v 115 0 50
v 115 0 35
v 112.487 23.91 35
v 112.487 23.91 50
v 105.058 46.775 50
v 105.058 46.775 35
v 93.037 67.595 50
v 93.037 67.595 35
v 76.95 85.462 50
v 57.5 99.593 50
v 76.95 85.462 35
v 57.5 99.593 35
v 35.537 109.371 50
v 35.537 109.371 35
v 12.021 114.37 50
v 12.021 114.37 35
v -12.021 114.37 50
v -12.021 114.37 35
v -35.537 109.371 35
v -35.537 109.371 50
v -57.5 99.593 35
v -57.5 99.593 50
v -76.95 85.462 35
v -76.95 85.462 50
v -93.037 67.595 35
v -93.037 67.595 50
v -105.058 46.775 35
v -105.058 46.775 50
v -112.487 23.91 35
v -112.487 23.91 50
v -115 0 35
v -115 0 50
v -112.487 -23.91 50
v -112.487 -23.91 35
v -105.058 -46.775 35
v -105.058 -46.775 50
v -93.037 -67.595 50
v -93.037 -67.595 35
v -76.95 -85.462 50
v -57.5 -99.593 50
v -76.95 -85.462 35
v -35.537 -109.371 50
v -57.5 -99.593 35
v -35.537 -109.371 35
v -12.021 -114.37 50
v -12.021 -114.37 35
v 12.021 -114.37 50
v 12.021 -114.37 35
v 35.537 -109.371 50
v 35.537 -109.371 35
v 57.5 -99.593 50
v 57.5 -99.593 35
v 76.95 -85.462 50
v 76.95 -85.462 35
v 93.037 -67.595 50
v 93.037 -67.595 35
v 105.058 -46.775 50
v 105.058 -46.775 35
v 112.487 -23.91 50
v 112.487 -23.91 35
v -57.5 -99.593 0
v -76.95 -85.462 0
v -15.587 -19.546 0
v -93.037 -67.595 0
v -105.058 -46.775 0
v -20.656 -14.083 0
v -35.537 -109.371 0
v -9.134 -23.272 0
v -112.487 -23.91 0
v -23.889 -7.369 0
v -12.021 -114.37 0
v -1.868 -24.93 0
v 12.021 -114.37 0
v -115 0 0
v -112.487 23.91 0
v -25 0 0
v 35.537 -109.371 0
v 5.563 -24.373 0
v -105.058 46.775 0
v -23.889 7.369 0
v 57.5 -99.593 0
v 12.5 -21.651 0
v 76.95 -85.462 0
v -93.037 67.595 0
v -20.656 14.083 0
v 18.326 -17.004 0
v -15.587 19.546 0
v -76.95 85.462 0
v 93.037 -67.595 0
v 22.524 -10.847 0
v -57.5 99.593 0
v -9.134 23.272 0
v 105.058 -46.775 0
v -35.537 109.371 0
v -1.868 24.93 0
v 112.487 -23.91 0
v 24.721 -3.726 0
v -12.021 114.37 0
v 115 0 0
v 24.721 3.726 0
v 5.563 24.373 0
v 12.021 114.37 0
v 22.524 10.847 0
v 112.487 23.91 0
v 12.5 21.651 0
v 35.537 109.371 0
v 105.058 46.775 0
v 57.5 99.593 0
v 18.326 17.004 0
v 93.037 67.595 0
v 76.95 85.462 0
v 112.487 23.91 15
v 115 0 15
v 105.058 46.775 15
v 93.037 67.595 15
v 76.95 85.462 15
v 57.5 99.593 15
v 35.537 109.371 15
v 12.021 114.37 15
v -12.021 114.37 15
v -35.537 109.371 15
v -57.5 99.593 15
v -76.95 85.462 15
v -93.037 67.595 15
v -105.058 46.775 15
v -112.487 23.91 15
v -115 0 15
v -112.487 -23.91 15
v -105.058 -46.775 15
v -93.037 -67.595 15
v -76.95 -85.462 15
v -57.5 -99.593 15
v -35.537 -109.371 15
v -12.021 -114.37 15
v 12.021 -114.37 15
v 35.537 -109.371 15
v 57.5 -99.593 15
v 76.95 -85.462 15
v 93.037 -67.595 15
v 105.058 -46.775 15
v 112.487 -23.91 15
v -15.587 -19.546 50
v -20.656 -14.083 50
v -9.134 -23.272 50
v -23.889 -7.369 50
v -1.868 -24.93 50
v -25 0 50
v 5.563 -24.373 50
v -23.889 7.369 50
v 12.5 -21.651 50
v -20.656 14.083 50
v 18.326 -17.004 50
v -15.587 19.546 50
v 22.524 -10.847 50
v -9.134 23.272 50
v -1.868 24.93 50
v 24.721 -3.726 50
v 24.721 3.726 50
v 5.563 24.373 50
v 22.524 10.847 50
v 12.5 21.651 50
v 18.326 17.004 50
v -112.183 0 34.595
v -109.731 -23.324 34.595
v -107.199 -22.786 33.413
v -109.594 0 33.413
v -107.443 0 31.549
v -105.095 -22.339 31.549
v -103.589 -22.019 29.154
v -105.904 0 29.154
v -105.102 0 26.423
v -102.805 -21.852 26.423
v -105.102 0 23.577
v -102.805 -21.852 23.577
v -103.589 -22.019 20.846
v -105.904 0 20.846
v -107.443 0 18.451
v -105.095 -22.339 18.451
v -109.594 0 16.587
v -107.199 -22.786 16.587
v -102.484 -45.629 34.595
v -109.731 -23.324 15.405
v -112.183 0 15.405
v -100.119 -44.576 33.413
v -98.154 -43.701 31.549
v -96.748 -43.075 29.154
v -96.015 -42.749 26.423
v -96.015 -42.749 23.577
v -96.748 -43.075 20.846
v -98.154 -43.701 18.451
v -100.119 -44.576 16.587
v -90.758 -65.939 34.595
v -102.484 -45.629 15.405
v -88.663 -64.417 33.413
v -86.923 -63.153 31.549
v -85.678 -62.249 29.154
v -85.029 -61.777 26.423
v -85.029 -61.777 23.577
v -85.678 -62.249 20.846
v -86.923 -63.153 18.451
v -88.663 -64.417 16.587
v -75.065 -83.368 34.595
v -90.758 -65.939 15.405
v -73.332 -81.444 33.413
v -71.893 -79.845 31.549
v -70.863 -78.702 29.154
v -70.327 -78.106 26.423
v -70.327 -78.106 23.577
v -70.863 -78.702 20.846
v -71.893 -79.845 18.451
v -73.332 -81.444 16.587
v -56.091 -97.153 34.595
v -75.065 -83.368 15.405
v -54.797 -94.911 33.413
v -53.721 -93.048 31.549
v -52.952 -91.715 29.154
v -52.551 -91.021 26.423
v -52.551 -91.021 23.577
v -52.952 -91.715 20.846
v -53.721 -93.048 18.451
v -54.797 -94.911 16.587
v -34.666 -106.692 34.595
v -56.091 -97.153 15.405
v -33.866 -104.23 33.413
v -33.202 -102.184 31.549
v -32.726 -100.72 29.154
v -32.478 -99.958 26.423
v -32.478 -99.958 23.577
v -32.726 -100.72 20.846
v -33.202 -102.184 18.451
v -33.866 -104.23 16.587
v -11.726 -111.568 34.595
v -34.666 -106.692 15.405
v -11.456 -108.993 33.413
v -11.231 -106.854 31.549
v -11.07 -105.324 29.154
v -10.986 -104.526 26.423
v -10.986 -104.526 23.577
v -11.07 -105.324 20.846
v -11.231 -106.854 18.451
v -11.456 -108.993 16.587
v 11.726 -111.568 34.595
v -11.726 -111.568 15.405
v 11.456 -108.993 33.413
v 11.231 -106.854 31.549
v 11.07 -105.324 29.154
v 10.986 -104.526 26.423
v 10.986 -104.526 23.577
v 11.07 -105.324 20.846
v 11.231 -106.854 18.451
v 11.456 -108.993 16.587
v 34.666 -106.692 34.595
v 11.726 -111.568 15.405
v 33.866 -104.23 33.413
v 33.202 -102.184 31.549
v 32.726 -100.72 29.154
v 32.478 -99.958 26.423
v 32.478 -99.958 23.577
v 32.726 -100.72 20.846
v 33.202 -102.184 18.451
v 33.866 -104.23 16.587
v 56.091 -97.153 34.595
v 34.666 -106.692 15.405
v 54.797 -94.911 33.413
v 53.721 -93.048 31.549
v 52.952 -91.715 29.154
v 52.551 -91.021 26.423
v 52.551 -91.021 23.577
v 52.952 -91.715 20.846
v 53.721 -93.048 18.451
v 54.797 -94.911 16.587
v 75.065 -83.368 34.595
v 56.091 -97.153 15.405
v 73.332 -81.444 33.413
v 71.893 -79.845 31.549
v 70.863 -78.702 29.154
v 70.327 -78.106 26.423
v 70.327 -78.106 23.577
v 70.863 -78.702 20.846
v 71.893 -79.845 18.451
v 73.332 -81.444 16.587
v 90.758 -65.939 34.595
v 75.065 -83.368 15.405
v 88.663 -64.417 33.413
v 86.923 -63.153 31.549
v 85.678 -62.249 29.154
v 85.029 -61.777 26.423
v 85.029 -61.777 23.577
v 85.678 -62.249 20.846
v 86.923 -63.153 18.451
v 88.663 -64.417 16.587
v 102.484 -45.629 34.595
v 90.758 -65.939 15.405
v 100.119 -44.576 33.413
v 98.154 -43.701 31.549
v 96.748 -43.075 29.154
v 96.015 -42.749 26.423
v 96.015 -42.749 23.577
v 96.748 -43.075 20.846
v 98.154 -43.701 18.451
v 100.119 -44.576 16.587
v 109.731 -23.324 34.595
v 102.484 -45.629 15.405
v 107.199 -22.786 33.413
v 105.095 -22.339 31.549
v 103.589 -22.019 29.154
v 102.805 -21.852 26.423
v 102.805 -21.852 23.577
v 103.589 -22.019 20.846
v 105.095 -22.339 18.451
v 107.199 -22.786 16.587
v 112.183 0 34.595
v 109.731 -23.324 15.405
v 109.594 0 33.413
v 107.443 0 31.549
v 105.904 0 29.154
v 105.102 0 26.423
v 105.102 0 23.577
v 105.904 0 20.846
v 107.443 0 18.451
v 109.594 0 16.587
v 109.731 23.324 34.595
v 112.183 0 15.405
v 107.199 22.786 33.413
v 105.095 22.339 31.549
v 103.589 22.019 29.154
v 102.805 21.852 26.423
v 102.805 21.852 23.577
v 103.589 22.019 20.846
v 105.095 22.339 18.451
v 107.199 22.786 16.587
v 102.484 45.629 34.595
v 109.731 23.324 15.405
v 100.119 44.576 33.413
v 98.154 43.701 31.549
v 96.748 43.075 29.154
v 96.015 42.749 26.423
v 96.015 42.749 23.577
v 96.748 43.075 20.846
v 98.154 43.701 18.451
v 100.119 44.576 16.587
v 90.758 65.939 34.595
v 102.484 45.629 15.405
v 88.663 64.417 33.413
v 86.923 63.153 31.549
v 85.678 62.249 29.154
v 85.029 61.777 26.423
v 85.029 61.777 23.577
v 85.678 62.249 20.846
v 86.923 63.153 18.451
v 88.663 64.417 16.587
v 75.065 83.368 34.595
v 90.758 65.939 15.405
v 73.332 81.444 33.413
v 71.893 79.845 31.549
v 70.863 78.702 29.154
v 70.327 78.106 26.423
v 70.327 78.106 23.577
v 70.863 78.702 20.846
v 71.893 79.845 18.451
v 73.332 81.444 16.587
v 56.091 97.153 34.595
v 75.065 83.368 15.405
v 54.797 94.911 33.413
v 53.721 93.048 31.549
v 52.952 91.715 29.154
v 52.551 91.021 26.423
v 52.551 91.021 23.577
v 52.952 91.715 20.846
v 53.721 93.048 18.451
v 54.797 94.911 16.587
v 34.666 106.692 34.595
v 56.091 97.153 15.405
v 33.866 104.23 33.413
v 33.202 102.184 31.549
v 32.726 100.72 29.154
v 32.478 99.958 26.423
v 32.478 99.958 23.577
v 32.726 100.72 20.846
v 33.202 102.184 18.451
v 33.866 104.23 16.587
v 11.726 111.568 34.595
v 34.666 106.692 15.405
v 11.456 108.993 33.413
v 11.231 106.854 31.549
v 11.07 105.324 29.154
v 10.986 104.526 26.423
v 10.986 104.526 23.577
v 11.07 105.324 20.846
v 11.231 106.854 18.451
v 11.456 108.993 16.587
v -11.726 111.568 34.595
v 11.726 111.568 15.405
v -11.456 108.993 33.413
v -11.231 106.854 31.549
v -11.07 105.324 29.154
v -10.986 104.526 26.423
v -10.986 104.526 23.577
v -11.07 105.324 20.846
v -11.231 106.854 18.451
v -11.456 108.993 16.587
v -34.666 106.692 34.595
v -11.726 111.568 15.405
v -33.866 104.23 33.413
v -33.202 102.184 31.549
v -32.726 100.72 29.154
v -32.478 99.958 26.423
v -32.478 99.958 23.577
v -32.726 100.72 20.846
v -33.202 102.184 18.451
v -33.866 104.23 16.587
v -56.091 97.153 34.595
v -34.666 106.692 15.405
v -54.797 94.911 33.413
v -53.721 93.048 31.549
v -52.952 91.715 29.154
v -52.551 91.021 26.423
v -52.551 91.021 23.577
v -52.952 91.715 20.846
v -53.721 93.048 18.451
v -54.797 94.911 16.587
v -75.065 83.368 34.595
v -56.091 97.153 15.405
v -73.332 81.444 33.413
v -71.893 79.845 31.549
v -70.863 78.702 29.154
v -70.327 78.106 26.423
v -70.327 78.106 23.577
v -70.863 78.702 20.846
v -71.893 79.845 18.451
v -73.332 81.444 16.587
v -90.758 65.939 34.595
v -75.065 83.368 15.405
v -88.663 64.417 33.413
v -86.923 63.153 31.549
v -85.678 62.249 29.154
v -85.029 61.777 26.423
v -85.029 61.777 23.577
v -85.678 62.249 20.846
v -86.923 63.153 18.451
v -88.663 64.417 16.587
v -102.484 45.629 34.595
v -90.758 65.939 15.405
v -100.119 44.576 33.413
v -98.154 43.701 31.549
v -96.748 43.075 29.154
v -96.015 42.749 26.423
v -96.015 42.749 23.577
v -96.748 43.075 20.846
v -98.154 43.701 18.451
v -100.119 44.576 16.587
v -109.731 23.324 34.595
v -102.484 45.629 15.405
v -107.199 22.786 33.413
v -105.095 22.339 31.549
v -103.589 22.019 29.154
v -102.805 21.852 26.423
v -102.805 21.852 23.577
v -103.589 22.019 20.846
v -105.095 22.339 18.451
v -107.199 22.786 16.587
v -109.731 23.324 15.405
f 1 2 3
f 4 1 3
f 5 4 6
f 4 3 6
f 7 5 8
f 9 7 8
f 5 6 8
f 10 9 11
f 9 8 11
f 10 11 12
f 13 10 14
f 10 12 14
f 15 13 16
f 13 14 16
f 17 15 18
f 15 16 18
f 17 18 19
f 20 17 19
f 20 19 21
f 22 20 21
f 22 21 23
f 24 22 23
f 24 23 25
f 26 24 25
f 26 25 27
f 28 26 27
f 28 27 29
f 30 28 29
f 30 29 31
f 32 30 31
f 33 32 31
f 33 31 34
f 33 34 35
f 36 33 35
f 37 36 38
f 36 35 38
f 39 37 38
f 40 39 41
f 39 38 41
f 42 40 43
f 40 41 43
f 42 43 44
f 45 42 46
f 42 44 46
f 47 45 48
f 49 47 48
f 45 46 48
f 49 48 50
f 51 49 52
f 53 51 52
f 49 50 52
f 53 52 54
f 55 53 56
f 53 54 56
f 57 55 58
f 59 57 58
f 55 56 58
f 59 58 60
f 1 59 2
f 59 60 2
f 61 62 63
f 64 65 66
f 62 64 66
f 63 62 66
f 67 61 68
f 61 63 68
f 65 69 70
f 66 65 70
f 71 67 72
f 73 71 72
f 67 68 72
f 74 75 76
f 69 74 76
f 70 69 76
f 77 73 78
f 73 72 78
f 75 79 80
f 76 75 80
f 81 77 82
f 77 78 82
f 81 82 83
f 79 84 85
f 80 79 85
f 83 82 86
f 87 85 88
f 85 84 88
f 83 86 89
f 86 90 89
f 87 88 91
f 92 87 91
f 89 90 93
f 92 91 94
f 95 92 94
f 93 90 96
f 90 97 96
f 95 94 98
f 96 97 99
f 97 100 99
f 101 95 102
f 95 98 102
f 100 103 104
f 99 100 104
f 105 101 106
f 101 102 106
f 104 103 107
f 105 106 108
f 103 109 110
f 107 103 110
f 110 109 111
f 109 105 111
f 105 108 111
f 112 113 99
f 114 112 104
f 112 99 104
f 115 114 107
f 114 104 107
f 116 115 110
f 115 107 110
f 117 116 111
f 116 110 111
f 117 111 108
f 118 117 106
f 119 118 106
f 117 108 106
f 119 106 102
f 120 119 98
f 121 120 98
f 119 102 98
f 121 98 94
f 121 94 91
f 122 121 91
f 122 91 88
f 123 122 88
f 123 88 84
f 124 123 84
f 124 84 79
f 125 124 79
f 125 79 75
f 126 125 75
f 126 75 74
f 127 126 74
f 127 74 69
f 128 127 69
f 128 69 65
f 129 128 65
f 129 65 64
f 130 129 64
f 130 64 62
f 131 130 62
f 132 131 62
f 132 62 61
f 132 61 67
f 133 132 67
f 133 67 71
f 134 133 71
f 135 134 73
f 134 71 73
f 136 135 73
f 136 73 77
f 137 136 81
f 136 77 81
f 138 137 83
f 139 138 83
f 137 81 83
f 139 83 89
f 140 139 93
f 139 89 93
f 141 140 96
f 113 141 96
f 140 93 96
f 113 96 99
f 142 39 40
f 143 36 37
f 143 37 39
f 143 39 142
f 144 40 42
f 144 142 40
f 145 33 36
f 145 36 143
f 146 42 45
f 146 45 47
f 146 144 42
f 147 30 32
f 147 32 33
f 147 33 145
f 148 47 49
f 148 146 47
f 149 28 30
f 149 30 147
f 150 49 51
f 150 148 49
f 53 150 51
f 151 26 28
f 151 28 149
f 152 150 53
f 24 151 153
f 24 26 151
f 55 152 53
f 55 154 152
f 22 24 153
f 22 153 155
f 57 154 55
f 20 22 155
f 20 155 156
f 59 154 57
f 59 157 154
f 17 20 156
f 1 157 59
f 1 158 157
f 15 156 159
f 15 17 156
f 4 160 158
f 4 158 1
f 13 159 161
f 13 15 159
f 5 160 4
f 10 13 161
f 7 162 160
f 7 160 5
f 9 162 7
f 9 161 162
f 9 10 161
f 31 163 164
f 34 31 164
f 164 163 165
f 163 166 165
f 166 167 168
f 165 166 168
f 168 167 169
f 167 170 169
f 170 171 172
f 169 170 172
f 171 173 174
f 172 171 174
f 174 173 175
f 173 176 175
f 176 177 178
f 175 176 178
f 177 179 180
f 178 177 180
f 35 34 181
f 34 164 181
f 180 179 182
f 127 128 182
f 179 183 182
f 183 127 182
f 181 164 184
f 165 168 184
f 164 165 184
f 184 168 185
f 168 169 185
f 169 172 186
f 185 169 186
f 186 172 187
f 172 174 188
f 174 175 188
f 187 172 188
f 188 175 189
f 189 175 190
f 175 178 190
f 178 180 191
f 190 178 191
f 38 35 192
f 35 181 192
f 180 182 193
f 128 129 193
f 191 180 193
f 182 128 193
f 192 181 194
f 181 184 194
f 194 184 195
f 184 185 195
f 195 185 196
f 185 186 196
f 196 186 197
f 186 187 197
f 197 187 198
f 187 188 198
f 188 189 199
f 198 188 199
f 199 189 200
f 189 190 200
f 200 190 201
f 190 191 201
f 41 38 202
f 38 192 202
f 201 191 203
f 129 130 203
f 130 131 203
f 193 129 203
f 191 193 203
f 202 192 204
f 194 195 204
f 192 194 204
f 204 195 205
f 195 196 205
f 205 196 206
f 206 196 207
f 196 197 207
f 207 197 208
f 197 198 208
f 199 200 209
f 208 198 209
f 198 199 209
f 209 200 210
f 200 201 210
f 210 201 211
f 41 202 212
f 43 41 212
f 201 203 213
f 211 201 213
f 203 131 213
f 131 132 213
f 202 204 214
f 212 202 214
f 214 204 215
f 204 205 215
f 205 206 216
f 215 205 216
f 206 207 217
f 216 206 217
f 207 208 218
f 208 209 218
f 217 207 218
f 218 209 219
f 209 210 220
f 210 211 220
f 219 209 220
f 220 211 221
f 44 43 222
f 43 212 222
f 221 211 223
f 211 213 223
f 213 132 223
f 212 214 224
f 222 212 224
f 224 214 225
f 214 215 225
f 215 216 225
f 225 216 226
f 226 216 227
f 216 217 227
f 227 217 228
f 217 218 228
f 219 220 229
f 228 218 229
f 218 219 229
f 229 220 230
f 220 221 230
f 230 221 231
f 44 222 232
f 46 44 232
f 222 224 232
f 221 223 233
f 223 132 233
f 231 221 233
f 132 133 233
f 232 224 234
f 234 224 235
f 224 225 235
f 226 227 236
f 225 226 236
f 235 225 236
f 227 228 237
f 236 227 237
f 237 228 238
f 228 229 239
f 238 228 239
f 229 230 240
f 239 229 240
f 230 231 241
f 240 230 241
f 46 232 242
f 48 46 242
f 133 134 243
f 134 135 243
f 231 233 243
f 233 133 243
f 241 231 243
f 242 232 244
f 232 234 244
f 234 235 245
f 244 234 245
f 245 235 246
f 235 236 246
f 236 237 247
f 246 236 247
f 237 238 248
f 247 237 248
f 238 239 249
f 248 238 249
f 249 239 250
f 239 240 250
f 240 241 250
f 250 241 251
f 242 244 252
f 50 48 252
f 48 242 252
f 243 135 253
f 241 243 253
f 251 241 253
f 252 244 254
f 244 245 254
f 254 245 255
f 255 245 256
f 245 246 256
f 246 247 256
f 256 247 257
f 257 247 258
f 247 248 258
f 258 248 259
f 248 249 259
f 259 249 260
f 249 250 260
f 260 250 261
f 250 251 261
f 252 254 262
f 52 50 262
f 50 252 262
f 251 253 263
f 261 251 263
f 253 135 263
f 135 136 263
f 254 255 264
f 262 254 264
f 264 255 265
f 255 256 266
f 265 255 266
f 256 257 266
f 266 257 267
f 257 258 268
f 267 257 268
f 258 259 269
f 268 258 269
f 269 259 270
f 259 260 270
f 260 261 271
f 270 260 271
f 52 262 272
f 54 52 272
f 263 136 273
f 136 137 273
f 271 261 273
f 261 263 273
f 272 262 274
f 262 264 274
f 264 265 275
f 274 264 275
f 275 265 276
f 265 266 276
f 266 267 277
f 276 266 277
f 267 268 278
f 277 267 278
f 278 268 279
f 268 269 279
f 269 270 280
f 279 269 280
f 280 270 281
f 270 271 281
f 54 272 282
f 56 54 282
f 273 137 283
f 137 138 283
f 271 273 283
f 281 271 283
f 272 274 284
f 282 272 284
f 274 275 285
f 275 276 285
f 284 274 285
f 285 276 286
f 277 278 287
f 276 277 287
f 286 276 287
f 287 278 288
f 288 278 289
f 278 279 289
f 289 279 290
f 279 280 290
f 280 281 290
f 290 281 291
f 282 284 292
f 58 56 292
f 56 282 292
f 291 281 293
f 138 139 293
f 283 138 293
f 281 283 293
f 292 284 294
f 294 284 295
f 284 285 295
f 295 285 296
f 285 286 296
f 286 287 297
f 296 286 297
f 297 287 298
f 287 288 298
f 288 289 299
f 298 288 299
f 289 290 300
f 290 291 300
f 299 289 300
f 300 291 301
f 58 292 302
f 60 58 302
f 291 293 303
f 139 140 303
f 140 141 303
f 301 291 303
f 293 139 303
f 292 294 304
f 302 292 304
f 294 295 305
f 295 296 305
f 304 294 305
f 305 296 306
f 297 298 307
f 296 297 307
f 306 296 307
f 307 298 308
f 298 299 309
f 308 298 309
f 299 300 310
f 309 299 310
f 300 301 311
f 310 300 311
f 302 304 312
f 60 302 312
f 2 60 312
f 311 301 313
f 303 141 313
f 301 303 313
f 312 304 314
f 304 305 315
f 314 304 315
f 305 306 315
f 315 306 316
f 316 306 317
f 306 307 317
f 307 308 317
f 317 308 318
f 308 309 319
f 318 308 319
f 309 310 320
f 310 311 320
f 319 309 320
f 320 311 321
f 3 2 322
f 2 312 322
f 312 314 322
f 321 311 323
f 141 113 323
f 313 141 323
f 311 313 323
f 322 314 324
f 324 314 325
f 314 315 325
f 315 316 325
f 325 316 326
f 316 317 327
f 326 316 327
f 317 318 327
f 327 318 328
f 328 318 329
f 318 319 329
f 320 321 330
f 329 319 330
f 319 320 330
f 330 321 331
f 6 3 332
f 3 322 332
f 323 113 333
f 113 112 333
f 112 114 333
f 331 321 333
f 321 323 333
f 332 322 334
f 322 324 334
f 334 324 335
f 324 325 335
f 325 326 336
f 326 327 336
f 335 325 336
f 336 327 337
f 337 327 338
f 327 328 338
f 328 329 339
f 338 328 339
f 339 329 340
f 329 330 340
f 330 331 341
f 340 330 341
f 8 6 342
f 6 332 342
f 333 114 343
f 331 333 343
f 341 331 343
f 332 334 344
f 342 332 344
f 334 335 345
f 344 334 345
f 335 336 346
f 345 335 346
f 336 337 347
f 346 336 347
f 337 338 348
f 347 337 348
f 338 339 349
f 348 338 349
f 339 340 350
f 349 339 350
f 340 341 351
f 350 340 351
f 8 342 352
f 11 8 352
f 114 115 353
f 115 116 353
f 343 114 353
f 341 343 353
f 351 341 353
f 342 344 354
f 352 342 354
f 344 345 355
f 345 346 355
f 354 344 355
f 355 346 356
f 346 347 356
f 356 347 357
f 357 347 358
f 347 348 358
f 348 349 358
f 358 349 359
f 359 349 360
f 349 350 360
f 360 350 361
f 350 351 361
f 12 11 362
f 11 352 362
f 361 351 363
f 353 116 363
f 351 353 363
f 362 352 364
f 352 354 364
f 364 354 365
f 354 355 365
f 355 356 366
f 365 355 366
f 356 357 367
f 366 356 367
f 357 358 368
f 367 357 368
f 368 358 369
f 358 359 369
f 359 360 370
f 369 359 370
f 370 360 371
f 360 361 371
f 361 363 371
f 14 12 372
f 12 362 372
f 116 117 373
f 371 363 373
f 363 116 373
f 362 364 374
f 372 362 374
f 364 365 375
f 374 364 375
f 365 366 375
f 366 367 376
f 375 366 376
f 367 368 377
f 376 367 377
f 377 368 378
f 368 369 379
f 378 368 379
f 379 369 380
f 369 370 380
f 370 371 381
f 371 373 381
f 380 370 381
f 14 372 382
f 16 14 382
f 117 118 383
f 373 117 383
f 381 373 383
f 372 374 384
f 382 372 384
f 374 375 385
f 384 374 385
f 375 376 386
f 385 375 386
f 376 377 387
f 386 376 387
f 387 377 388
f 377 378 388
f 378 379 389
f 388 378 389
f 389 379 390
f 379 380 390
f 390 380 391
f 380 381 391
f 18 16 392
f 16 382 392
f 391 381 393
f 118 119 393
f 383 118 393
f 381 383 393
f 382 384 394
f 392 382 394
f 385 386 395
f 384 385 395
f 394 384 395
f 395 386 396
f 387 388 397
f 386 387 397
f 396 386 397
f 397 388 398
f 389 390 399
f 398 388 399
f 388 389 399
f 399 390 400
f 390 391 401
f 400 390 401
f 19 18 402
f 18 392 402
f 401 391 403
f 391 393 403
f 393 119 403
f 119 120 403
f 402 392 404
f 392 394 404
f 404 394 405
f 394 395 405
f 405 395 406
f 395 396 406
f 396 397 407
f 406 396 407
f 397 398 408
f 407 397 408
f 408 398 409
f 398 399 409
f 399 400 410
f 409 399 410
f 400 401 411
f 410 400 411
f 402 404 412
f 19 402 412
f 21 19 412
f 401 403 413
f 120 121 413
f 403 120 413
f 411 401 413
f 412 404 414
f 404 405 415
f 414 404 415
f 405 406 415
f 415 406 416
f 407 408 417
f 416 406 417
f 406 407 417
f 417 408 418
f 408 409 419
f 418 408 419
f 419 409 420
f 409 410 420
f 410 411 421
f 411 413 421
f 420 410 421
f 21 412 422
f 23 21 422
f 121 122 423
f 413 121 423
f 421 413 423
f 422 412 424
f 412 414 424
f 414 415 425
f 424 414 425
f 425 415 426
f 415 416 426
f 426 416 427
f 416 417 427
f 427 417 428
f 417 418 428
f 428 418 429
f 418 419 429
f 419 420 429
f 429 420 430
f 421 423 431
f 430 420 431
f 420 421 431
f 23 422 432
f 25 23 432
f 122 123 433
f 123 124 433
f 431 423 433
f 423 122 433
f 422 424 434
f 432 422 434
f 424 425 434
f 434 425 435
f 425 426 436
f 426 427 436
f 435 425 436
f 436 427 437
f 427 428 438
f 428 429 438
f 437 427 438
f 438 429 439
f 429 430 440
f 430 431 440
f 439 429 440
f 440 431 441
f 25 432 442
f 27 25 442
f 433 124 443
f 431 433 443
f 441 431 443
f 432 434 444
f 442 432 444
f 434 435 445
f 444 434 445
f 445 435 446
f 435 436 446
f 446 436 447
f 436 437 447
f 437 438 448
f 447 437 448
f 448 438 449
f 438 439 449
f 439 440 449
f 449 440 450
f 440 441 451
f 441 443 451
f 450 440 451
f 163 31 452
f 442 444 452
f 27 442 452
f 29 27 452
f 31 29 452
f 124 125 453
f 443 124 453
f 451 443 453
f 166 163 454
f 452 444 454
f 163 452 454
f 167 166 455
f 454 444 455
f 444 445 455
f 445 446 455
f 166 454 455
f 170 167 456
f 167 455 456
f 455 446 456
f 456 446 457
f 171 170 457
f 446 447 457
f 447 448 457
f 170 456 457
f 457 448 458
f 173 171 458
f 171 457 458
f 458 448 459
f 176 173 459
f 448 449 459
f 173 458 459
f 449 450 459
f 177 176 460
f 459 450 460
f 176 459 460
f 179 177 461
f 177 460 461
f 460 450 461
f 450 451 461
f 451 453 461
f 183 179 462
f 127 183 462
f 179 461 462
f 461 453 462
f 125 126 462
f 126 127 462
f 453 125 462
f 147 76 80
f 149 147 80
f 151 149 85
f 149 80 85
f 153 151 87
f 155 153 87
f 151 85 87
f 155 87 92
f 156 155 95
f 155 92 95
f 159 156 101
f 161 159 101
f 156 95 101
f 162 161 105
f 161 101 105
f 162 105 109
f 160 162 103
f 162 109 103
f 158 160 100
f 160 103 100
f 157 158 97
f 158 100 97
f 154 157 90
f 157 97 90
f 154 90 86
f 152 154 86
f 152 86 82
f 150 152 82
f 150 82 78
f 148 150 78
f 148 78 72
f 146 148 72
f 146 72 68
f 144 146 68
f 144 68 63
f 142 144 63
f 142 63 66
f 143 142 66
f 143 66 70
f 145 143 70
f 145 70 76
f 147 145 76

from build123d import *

# Parameters (mm, degrees)
SKETCH1_R           = 115
BOSS_EXTRUDE1_DEPTH = 50
SKETCH2_R           = 10
SKETCH3_R           = 25
CUT_EXTRUDE1_DEPTH  = 171.146995272


with BuildPart() as part:
    # Sketch1 → Boss-Extrude1 (new body)
    with BuildSketch(Plane.XY):
        Circle(SKETCH1_R)
    extrude(amount=BOSS_EXTRUDE1_DEPTH)

    # Sketch2 → Cut-Revolve1 (revolve, cut)
    with BuildSketch(Plane(origin=(0, 0, 0), x_dir=(0, 0, -1), z_dir=(1, 0, 0)), mode=Mode.PRIVATE) as cut_revolve1_sk:
        with Locations((-25, 115)):
            Circle(SKETCH2_R)
    revolve(cut_revolve1_sk.sketch.rotate(Axis((0, 0, 0), (0, 0, 1)), 90), axis=Axis((0, 0, 0), (0, 0, 1)), mode=Mode.SUBTRACT)

    # Sketch3 → Cut-Extrude1 (cut, through all)
    with BuildSketch(Plane(origin=(0, 0, 0), x_dir=(-1, 0, 0), z_dir=(0, 0, -1))):
        Circle(SKETCH3_R)
    extrude(amount=-CUT_EXTRUDE1_DEPTH, mode=Mode.SUBTRACT)


solid = part.part
